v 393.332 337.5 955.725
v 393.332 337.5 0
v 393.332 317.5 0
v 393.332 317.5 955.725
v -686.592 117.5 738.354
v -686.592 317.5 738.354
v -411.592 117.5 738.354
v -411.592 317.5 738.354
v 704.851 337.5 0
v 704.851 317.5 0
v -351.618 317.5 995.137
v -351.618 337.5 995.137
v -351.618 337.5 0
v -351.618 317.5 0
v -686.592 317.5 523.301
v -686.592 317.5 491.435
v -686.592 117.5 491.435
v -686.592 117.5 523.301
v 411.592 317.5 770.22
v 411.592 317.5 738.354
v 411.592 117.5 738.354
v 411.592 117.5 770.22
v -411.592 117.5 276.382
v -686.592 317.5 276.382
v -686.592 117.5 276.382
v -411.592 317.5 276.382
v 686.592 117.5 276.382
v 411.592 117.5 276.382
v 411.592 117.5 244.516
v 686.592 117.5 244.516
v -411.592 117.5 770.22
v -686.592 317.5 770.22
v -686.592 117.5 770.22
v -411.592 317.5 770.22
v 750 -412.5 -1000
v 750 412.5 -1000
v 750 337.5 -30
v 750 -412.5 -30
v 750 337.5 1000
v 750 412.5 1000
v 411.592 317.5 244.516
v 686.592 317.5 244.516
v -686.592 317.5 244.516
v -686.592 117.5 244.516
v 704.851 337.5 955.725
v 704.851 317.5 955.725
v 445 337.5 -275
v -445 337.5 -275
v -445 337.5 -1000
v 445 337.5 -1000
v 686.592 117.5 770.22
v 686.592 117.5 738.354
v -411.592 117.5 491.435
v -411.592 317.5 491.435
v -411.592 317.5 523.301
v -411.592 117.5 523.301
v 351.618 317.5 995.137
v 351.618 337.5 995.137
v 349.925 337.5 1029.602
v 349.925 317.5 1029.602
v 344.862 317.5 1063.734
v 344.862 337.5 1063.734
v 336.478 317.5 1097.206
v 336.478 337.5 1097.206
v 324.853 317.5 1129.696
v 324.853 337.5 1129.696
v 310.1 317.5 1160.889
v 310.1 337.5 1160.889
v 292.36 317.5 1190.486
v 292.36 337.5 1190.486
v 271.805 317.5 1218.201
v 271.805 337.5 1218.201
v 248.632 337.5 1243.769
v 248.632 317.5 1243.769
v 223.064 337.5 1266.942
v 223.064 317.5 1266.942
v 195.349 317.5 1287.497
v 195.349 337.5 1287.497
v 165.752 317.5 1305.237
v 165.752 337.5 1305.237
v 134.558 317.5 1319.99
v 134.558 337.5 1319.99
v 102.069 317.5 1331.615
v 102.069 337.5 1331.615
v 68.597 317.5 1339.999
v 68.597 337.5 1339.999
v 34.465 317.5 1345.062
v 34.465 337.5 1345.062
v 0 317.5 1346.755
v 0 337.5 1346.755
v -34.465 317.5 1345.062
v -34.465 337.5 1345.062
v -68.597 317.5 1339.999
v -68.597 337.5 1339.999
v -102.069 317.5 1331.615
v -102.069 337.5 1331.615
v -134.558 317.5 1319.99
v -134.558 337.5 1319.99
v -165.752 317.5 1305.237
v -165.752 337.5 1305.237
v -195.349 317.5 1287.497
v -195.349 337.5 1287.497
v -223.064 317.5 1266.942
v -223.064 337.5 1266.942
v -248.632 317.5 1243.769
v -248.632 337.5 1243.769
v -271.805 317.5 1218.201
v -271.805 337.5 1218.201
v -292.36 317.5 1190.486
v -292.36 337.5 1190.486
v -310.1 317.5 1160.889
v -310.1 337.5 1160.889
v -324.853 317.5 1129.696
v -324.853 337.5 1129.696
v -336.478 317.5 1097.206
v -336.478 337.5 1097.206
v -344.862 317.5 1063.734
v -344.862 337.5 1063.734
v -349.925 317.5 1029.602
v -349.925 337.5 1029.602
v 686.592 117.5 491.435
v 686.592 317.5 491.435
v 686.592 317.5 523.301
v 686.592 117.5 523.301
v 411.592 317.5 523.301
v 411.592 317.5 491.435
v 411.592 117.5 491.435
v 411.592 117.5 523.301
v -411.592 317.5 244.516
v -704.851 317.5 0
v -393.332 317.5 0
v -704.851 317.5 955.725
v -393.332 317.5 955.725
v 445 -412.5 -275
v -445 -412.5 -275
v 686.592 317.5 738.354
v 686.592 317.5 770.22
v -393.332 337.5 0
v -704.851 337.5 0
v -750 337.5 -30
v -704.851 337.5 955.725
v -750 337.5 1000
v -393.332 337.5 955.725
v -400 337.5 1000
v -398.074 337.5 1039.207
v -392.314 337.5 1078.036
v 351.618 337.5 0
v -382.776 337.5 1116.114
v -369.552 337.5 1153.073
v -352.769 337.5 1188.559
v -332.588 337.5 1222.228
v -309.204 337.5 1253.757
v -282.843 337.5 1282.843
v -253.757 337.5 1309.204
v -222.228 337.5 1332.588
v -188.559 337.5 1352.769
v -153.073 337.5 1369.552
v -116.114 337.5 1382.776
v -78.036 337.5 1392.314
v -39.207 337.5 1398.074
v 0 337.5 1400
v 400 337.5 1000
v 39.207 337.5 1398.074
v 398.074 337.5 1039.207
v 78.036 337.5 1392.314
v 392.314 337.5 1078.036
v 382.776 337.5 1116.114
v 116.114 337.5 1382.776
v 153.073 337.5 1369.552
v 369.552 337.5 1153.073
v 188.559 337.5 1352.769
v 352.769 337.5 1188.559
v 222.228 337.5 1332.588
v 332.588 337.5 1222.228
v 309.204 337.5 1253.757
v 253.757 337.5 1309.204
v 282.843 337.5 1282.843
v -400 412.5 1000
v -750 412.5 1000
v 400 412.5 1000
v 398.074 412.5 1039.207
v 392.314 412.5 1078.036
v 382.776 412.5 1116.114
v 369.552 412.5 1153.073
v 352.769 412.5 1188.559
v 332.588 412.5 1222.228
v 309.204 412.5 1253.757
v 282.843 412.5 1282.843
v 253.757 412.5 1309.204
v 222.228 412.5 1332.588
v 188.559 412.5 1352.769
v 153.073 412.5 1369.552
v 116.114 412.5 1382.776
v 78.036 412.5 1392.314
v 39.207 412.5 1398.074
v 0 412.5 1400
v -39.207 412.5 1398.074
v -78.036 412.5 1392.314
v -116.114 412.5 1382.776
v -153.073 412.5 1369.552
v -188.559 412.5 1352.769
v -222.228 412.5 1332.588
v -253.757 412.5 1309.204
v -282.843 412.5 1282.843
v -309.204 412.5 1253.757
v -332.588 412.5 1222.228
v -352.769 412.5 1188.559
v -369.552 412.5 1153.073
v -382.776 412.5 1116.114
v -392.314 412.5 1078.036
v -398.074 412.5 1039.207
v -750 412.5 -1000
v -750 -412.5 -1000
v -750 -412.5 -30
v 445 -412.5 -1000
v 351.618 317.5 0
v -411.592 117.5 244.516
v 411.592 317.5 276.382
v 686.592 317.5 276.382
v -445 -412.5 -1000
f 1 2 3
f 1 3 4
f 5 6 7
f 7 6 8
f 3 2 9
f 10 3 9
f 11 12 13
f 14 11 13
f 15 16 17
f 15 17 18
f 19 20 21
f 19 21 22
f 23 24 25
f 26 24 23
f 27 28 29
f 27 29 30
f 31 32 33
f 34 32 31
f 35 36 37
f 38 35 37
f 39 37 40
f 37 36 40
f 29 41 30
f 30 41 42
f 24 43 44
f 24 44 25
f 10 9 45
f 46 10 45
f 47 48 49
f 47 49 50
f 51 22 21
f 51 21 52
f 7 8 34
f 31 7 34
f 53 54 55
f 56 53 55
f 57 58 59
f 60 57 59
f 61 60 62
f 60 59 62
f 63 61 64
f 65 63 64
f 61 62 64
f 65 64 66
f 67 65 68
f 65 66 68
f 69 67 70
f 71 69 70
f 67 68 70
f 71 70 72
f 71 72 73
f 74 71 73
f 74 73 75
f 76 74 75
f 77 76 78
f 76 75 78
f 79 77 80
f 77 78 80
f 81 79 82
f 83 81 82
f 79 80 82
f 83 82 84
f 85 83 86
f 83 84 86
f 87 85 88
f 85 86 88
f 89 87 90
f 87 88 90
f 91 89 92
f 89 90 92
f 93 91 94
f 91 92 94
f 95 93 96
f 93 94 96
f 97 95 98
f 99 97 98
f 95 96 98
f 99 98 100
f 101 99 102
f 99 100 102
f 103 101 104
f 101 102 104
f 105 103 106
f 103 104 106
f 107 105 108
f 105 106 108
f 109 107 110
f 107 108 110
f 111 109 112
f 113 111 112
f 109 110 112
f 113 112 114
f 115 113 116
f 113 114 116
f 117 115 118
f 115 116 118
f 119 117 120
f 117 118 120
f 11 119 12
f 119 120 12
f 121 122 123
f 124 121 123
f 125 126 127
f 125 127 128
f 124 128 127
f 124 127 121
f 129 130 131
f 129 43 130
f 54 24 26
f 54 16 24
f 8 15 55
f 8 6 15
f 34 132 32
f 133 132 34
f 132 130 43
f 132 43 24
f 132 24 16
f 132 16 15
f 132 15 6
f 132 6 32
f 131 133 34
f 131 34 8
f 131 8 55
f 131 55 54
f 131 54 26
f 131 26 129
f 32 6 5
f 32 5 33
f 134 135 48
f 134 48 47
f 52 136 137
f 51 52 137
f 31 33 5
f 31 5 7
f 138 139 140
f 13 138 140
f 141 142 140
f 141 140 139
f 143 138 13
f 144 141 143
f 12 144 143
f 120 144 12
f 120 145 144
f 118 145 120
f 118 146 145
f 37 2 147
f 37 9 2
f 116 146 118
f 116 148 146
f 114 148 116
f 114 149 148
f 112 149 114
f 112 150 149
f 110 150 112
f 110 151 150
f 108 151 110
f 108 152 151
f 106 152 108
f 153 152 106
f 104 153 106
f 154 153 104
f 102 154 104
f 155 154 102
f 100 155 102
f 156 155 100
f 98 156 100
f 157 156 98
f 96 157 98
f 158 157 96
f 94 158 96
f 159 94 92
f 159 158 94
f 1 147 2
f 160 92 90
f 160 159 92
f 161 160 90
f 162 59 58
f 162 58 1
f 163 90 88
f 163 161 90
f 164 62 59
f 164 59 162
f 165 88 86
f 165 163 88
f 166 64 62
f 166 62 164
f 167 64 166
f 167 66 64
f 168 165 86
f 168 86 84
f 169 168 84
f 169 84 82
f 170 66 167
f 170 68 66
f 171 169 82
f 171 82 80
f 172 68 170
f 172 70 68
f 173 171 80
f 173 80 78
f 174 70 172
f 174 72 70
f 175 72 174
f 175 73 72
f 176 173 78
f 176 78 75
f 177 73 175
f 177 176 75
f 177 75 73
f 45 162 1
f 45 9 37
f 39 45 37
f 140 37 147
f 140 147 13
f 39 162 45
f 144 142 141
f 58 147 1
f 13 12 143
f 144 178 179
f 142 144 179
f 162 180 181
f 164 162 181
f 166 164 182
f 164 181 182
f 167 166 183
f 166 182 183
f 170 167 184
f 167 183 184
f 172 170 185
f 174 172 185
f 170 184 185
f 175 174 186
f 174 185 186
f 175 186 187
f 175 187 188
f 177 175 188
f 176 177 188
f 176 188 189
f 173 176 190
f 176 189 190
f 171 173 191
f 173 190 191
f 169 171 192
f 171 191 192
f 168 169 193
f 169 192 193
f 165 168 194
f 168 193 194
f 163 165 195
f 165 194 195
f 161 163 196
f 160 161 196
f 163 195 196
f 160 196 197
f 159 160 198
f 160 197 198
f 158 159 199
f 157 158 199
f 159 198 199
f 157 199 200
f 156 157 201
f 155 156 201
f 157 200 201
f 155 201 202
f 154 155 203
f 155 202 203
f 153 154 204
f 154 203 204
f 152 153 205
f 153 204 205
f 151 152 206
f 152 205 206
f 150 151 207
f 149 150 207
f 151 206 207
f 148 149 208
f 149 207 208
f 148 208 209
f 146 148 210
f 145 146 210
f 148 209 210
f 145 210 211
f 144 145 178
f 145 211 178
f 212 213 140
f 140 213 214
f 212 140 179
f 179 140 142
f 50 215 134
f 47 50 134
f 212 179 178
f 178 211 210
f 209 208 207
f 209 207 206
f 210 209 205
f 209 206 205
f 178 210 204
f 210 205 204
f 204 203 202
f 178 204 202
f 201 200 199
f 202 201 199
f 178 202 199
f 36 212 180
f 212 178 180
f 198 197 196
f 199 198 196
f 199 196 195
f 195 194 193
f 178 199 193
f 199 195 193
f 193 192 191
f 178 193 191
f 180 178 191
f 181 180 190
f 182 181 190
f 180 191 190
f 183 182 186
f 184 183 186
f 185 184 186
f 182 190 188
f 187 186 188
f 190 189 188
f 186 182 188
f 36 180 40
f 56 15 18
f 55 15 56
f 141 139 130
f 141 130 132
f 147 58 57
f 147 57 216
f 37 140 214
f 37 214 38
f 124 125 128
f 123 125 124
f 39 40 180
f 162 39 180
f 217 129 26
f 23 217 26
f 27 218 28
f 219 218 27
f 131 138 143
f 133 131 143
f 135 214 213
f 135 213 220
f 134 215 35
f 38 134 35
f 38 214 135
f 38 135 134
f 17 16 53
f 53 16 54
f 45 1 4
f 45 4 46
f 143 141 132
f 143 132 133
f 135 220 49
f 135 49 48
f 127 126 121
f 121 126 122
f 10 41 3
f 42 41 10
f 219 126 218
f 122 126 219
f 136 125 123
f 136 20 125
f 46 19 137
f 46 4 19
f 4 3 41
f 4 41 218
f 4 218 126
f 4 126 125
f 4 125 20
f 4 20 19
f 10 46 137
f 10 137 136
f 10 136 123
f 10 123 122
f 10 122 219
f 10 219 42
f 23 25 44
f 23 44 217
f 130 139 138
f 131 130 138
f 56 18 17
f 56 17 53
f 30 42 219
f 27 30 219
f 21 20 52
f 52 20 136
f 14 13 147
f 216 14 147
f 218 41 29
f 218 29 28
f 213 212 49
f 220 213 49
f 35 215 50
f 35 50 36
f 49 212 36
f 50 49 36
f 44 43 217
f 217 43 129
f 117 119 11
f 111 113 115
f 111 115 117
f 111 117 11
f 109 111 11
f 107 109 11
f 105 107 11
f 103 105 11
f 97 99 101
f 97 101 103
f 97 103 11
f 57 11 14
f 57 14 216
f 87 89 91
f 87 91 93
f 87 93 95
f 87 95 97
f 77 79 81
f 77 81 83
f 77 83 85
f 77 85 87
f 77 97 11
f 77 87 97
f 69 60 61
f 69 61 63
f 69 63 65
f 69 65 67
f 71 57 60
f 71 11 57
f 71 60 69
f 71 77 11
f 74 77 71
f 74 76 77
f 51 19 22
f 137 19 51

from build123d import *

# Parameters (mm, degrees)
PAD_DEPTH     = 75
SKETCH001_W   = 311.518585
SKETCH001_H   = 955.725281
PAD001_DEPTH  = 20
SKETCH002_W   = 275
SKETCH002_H   = 31.865801
PAD002_DEPTH  = 200
SKETCH003_W   = 1500
SKETCH003_H   = 970
PAD003_DEPTH  = 750
SKETCH004_W   = 890
SKETCH004_H   = 725
POCKET_DEPTH  = 750
SKETCH005_W   = 305
SKETCH005_H   = 245
SKETCH005_H_2 = 180
PAD004_DEPTH  = 25
SKETCH006_W   = 305
SKETCH006_H   = 185
SKETCH006_H_2 = 180
SKETCH006_W_2 = 890
SKETCH006_H_3 = 245
PAD005_DEPTH  = 25


with BuildPart() as part:
    # Sketch → Pad (new body)
    with BuildSketch(Plane.XZ):
        with BuildLine():
            Line((-750, -1000), (750, -1000))
            Line((750, -1000), (750, 1000))
            Line((750, 1000), (400, 1000))
            ThreePointArc((400, 1000), (0, 1400), (-400, 1000))
            Line((-400, 1000), (-750, 1000))
            Line((-750, 1000), (-750, -1000))
        make_face()
    extrude(amount=PAD_DEPTH)

    # Sketch001 (on Face8 of Pad) → Pad001 (join)
    with BuildSketch(Plane.XZ.offset(75)):
        with BuildLine():
            ThreePointArc((351.618271, 995.137056), (0, 1346.755326), (-351.618271, 995.137056))
            Line((-351.618271, 995.137056), (-351.618271, 0))
            Line((-351.618271, 0), (351.618271, 0))
            Line((351.618271, 995.137056), (351.618271, 0))
        make_face()
        with Locations((549.091598, 477.86264)):
            Rectangle(SKETCH001_W, SKETCH001_H)
        with Locations((-549.091598, 477.86264)):
            Rectangle(SKETCH001_W, SKETCH001_H)
    extrude(amount=PAD001_DEPTH)

    # Sketch002 (on Face21 of Pad001) → Pad002 (join)
    with BuildSketch(Plane.XZ.offset(95)):
        with Locations((-549.091599, 754.287087)):
            Rectangle(SKETCH002_W, SKETCH002_H)
        with Locations((-549.091599, 507.368162)):
            Rectangle(SKETCH002_W, SKETCH002_H)
        with Locations((-549.091599, 260.449237)):
            Rectangle(SKETCH002_W, SKETCH002_H)
        with Locations((549.091599, 754.287087)):
            Rectangle(SKETCH002_W, SKETCH002_H)
        with Locations((549.091599, 507.368162)):
            Rectangle(SKETCH002_W, SKETCH002_H)
        with Locations((549.091599, 260.449237)):
            Rectangle(SKETCH002_W, SKETCH002_H)
    extrude(amount=PAD002_DEPTH)

    # Sketch003 (on Face5 of Pad002) → Pad003 (join)
    with BuildSketch(Plane.XZ.offset(75)):
        with Locations((0, -515)):
            Rectangle(SKETCH003_W, SKETCH003_H)
    extrude(amount=PAD003_DEPTH)

    # Sketch004 (on Face12 of Pad003) → Pocket (cut)
    with BuildSketch(Plane.XZ.offset(825)):
        with Locations((0, -637.5)):
            Rectangle(SKETCH004_W, SKETCH004_H)
    extrude(amount=-POCKET_DEPTH, mode=Mode.SUBTRACT)

    # Sketch005 (on Face15 of Pocket) → Pad004 (join)
    with BuildSketch(Plane.XZ.offset(825)):
        with Locations((-597.5, -152.5)):
            Rectangle(SKETCH005_W, SKETCH005_H)
        with Locations((-597.5, -550)):
            Rectangle(SKETCH005_W, SKETCH005_H_2)
        with Locations((-597.5, -910)):
            Rectangle(SKETCH005_W, SKETCH005_H_2)
        with Locations((597.5, -152.5)):
            Rectangle(SKETCH005_W, SKETCH005_H)
        with Locations((597.5, -550)):
            Rectangle(SKETCH005_W, SKETCH005_H_2)
        with Locations((597.5, -910)):
            Rectangle(SKETCH005_W, SKETCH005_H_2)
    extrude(amount=-PAD004_DEPTH)

    # Sketch006 (on Face35 of Pad004) → Pad005 (join)
    with BuildSketch(Plane.XZ.offset(825)):
        with Locations((-597.5, -367.5)):
            Rectangle(SKETCH006_W, SKETCH006_H)
        with Locations((-597.5, -730)):
            Rectangle(SKETCH006_W, SKETCH006_H_2)
        with Locations((597.5, -367.5)):
            Rectangle(SKETCH006_W, SKETCH006_H)
        with Locations((597.5, -730)):
            Rectangle(SKETCH006_W, SKETCH006_H_2)
        with Locations((0, -152.5)):
            Rectangle(SKETCH006_W_2, SKETCH006_H_3)
    extrude(amount=-PAD005_DEPTH)


with BuildPart() as part_1:
    # Body placement: moved
    add(part.part.moved(Location((0, 412.5, 0))))


solid = part_1.part
